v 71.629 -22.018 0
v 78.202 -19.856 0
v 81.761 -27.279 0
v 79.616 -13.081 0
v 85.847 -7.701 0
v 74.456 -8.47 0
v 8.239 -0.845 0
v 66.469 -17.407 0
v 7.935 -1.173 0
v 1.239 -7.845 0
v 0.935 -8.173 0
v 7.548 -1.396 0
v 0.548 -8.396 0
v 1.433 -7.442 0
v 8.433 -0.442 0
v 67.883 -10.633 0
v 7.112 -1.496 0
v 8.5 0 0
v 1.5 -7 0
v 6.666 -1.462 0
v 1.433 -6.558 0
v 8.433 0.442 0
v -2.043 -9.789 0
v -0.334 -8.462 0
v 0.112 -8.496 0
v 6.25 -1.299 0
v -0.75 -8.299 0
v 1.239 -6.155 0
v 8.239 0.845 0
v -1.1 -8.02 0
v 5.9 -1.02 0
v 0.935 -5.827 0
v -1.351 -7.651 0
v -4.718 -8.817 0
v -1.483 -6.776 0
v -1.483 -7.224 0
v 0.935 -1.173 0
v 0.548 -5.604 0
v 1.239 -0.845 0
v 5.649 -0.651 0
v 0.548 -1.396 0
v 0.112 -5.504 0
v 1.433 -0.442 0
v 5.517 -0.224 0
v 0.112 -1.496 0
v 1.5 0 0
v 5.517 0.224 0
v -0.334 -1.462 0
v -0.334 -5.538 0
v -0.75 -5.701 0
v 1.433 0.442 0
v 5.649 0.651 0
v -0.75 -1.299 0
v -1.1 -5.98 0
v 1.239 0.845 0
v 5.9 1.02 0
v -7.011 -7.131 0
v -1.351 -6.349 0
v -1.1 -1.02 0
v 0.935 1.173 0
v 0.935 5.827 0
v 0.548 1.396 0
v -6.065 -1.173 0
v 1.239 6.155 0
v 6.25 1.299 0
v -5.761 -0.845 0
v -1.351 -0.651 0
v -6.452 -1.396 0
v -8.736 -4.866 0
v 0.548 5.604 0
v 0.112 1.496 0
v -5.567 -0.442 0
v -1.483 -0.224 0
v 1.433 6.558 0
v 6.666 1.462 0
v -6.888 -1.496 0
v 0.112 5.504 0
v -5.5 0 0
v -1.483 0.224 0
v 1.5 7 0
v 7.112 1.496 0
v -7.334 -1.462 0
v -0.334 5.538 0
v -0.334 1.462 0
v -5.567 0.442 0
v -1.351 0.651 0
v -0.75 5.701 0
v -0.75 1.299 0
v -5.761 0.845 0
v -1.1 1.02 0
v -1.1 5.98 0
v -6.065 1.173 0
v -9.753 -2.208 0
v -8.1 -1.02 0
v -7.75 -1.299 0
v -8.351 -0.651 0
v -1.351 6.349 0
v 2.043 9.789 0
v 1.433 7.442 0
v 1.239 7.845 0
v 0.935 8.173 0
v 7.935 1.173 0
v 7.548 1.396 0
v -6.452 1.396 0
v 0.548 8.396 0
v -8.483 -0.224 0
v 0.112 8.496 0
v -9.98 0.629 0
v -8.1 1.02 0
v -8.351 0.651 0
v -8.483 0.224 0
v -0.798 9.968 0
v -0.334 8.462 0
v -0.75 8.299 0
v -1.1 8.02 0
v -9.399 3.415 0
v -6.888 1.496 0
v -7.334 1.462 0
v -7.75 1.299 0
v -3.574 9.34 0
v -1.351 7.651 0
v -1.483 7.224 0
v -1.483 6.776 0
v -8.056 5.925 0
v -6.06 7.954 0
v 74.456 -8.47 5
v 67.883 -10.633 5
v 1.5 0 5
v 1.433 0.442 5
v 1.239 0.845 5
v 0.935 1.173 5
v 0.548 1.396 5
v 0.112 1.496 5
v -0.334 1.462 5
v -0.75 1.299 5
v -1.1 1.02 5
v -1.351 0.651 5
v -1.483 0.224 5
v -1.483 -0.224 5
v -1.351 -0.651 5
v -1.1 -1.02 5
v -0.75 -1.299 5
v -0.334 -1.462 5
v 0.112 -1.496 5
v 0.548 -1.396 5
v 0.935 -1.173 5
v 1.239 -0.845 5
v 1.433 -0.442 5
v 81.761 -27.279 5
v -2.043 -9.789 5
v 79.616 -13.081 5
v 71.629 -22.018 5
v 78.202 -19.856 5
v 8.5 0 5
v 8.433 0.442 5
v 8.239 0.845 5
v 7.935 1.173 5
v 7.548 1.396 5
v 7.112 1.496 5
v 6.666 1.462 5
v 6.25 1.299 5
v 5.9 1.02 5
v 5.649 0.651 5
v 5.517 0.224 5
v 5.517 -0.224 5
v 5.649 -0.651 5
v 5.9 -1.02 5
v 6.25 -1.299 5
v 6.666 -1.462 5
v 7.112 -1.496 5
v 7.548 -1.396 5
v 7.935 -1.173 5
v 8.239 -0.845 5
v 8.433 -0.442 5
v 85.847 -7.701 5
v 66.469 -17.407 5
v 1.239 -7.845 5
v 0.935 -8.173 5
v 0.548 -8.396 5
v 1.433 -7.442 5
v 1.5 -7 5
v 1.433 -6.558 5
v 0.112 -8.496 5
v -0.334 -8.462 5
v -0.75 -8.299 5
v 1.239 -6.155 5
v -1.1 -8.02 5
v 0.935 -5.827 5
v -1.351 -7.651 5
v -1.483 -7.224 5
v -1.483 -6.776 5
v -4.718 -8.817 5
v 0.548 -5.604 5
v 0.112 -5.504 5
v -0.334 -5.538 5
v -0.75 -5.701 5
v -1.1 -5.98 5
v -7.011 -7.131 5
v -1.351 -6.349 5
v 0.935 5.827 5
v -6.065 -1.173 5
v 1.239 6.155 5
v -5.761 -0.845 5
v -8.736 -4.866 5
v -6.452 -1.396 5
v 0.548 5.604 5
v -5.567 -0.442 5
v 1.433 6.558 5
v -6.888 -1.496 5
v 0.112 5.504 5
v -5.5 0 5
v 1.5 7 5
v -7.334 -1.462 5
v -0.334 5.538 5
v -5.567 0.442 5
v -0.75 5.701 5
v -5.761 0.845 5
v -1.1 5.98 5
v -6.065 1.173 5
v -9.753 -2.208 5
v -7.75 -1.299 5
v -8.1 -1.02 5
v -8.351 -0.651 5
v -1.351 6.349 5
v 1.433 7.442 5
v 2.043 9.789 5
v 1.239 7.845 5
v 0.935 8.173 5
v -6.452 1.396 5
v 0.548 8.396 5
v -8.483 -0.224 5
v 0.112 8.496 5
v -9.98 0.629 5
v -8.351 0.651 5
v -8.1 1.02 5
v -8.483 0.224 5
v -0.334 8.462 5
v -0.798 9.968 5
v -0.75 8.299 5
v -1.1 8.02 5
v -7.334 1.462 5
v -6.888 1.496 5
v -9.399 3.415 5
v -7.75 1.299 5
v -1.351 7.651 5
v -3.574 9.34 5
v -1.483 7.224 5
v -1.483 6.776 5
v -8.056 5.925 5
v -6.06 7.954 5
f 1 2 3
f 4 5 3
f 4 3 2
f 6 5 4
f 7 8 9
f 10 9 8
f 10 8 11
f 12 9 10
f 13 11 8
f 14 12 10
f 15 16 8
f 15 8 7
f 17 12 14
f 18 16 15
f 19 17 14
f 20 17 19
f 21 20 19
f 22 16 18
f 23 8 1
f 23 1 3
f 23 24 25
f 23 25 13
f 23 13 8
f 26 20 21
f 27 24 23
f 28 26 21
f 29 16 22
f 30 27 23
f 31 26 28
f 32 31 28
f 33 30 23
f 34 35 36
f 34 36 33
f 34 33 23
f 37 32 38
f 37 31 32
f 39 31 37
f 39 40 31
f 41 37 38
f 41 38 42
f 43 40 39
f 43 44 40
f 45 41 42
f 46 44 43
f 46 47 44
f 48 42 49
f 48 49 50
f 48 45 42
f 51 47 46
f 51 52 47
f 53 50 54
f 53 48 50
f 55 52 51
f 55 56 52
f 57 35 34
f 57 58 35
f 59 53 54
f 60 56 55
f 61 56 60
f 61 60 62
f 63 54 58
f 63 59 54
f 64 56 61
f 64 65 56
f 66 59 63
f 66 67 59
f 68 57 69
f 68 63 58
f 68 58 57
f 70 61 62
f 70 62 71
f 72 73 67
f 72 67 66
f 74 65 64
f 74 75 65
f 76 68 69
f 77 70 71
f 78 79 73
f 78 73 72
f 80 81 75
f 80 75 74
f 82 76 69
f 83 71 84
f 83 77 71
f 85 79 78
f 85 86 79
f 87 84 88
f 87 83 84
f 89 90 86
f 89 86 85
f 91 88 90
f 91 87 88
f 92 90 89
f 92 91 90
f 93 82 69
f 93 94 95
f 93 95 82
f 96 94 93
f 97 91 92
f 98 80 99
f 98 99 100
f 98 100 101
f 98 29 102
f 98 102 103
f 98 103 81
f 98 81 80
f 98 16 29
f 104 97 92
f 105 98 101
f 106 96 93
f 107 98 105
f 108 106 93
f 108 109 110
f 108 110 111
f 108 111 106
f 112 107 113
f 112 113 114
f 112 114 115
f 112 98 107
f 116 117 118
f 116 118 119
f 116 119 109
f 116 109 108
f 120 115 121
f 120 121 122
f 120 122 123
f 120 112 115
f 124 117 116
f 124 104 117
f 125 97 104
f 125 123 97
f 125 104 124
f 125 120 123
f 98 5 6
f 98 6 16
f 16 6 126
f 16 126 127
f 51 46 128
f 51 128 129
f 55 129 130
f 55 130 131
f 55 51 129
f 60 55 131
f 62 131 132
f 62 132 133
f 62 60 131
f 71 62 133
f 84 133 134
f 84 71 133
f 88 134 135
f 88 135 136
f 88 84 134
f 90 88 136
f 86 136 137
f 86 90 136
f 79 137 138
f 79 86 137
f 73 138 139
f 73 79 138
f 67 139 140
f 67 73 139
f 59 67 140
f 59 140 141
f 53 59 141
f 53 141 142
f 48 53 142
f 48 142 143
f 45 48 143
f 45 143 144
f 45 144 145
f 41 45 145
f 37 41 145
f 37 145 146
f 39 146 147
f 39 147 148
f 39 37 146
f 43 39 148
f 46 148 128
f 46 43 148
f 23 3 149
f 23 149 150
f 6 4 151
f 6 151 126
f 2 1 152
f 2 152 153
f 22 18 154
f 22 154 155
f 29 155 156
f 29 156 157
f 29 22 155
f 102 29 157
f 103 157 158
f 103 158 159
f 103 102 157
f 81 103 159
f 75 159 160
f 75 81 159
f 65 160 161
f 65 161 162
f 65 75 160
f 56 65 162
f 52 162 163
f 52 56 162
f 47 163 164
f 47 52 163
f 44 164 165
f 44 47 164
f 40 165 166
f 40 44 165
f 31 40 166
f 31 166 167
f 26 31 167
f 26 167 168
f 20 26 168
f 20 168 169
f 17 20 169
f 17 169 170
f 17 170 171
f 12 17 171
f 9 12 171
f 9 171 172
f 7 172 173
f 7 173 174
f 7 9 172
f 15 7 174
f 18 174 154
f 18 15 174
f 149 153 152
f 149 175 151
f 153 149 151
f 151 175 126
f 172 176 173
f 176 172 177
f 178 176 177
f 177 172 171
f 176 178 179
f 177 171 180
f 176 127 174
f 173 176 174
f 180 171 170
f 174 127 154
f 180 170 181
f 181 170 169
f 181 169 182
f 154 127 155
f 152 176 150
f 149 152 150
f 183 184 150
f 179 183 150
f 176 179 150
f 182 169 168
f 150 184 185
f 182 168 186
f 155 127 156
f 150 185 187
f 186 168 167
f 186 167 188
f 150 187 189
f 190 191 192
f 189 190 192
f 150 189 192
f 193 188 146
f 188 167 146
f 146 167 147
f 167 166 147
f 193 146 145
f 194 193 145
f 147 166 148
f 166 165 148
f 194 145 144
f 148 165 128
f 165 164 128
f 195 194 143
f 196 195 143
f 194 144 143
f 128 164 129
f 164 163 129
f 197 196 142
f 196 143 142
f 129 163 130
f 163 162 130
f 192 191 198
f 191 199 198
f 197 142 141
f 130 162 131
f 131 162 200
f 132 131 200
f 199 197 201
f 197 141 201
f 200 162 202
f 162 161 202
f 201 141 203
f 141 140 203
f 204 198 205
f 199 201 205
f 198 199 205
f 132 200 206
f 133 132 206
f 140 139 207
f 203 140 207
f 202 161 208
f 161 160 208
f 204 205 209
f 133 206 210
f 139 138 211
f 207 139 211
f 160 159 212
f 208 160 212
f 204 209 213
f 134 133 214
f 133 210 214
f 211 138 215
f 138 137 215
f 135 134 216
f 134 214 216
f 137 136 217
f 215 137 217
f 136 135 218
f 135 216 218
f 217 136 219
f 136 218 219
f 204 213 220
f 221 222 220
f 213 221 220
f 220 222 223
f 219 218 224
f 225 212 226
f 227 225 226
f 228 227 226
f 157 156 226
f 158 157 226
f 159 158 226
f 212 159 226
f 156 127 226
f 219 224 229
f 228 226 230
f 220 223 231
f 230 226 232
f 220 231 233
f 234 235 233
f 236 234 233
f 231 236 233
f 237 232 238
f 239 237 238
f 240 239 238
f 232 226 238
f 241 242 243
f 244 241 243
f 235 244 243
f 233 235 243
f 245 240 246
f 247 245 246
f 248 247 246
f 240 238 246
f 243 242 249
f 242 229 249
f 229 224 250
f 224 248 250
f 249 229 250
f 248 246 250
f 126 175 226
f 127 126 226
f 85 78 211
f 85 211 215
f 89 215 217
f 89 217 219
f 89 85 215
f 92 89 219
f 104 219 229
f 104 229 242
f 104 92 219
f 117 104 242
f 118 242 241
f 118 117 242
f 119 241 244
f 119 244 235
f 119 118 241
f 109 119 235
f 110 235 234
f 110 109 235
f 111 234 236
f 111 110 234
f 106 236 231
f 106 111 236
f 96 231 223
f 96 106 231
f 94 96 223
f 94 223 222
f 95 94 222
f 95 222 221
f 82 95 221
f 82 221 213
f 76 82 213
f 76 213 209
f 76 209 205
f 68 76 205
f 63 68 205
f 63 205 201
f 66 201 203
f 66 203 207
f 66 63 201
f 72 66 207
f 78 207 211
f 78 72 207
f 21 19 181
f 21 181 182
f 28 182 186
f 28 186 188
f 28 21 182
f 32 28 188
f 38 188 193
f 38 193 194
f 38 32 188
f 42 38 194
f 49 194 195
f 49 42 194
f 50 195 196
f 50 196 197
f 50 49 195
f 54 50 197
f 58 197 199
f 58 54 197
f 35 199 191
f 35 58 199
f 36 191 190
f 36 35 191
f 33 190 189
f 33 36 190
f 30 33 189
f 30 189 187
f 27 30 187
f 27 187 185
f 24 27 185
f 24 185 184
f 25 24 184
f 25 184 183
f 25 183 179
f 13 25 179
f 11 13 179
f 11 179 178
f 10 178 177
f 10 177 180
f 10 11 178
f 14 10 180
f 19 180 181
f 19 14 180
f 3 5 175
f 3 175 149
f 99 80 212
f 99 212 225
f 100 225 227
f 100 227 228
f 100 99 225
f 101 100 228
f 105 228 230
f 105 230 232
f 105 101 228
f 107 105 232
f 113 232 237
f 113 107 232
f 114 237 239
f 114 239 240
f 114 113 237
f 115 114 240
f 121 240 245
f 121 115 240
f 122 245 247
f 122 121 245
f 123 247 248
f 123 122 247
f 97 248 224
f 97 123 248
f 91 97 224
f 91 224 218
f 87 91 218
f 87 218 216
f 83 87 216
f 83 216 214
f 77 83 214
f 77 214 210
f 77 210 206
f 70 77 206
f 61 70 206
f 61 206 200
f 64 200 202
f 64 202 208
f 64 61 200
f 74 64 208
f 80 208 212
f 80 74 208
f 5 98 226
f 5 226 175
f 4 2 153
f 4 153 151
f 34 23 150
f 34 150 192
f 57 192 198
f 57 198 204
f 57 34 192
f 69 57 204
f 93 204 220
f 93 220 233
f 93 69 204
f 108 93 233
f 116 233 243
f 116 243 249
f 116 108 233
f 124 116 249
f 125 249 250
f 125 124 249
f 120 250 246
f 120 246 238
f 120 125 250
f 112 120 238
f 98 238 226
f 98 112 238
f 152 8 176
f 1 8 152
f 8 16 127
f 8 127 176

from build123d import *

# Parameters (mm, degrees)
SKETCH2_R           = 1.5
BOSS_EXTRUDE1_DEPTH = 5


with BuildPart() as part:
    # Sketch2 → Boss-Extrude1 (new body)
    with BuildSketch(Plane.XY):
        with BuildLine():
            Line((2.043003371, 9.789082553), (85.846562924, -7.700907316))
            Line((85.846562924, -7.700907316), (81.760556182, -27.279072422))
            Line((81.760556182, -27.279072422), (-2.043003371, -9.789082553))
            ThreePointArc((-2.043003371, -9.789082553), (-9.789082553, 2.043003371), (2.043003371, 9.789082553))
        make_face()
        Circle(SKETCH2_R, mode=Mode.SUBTRACT)
        with Locations((0, 7)):
            Circle(SKETCH2_R, mode=Mode.SUBTRACT)
        with Locations((0, -7)):
            Circle(SKETCH2_R, mode=Mode.SUBTRACT)
        with Locations((7, 0)):
            Circle(SKETCH2_R, mode=Mode.SUBTRACT)
        with Locations((-7, 0)):
            Circle(SKETCH2_R, mode=Mode.SUBTRACT)
        Polygon((74.456281443, -8.470092426), (67.882907111, -10.632764358), (66.469148778, -17.406809485), (71.628764778, -22.018182679), (78.20213911, -19.855510747), (79.615897443, -13.08146562), align=None, mode=Mode.SUBTRACT)
    extrude(amount=BOSS_EXTRUDE1_DEPTH)


solid = part.part
